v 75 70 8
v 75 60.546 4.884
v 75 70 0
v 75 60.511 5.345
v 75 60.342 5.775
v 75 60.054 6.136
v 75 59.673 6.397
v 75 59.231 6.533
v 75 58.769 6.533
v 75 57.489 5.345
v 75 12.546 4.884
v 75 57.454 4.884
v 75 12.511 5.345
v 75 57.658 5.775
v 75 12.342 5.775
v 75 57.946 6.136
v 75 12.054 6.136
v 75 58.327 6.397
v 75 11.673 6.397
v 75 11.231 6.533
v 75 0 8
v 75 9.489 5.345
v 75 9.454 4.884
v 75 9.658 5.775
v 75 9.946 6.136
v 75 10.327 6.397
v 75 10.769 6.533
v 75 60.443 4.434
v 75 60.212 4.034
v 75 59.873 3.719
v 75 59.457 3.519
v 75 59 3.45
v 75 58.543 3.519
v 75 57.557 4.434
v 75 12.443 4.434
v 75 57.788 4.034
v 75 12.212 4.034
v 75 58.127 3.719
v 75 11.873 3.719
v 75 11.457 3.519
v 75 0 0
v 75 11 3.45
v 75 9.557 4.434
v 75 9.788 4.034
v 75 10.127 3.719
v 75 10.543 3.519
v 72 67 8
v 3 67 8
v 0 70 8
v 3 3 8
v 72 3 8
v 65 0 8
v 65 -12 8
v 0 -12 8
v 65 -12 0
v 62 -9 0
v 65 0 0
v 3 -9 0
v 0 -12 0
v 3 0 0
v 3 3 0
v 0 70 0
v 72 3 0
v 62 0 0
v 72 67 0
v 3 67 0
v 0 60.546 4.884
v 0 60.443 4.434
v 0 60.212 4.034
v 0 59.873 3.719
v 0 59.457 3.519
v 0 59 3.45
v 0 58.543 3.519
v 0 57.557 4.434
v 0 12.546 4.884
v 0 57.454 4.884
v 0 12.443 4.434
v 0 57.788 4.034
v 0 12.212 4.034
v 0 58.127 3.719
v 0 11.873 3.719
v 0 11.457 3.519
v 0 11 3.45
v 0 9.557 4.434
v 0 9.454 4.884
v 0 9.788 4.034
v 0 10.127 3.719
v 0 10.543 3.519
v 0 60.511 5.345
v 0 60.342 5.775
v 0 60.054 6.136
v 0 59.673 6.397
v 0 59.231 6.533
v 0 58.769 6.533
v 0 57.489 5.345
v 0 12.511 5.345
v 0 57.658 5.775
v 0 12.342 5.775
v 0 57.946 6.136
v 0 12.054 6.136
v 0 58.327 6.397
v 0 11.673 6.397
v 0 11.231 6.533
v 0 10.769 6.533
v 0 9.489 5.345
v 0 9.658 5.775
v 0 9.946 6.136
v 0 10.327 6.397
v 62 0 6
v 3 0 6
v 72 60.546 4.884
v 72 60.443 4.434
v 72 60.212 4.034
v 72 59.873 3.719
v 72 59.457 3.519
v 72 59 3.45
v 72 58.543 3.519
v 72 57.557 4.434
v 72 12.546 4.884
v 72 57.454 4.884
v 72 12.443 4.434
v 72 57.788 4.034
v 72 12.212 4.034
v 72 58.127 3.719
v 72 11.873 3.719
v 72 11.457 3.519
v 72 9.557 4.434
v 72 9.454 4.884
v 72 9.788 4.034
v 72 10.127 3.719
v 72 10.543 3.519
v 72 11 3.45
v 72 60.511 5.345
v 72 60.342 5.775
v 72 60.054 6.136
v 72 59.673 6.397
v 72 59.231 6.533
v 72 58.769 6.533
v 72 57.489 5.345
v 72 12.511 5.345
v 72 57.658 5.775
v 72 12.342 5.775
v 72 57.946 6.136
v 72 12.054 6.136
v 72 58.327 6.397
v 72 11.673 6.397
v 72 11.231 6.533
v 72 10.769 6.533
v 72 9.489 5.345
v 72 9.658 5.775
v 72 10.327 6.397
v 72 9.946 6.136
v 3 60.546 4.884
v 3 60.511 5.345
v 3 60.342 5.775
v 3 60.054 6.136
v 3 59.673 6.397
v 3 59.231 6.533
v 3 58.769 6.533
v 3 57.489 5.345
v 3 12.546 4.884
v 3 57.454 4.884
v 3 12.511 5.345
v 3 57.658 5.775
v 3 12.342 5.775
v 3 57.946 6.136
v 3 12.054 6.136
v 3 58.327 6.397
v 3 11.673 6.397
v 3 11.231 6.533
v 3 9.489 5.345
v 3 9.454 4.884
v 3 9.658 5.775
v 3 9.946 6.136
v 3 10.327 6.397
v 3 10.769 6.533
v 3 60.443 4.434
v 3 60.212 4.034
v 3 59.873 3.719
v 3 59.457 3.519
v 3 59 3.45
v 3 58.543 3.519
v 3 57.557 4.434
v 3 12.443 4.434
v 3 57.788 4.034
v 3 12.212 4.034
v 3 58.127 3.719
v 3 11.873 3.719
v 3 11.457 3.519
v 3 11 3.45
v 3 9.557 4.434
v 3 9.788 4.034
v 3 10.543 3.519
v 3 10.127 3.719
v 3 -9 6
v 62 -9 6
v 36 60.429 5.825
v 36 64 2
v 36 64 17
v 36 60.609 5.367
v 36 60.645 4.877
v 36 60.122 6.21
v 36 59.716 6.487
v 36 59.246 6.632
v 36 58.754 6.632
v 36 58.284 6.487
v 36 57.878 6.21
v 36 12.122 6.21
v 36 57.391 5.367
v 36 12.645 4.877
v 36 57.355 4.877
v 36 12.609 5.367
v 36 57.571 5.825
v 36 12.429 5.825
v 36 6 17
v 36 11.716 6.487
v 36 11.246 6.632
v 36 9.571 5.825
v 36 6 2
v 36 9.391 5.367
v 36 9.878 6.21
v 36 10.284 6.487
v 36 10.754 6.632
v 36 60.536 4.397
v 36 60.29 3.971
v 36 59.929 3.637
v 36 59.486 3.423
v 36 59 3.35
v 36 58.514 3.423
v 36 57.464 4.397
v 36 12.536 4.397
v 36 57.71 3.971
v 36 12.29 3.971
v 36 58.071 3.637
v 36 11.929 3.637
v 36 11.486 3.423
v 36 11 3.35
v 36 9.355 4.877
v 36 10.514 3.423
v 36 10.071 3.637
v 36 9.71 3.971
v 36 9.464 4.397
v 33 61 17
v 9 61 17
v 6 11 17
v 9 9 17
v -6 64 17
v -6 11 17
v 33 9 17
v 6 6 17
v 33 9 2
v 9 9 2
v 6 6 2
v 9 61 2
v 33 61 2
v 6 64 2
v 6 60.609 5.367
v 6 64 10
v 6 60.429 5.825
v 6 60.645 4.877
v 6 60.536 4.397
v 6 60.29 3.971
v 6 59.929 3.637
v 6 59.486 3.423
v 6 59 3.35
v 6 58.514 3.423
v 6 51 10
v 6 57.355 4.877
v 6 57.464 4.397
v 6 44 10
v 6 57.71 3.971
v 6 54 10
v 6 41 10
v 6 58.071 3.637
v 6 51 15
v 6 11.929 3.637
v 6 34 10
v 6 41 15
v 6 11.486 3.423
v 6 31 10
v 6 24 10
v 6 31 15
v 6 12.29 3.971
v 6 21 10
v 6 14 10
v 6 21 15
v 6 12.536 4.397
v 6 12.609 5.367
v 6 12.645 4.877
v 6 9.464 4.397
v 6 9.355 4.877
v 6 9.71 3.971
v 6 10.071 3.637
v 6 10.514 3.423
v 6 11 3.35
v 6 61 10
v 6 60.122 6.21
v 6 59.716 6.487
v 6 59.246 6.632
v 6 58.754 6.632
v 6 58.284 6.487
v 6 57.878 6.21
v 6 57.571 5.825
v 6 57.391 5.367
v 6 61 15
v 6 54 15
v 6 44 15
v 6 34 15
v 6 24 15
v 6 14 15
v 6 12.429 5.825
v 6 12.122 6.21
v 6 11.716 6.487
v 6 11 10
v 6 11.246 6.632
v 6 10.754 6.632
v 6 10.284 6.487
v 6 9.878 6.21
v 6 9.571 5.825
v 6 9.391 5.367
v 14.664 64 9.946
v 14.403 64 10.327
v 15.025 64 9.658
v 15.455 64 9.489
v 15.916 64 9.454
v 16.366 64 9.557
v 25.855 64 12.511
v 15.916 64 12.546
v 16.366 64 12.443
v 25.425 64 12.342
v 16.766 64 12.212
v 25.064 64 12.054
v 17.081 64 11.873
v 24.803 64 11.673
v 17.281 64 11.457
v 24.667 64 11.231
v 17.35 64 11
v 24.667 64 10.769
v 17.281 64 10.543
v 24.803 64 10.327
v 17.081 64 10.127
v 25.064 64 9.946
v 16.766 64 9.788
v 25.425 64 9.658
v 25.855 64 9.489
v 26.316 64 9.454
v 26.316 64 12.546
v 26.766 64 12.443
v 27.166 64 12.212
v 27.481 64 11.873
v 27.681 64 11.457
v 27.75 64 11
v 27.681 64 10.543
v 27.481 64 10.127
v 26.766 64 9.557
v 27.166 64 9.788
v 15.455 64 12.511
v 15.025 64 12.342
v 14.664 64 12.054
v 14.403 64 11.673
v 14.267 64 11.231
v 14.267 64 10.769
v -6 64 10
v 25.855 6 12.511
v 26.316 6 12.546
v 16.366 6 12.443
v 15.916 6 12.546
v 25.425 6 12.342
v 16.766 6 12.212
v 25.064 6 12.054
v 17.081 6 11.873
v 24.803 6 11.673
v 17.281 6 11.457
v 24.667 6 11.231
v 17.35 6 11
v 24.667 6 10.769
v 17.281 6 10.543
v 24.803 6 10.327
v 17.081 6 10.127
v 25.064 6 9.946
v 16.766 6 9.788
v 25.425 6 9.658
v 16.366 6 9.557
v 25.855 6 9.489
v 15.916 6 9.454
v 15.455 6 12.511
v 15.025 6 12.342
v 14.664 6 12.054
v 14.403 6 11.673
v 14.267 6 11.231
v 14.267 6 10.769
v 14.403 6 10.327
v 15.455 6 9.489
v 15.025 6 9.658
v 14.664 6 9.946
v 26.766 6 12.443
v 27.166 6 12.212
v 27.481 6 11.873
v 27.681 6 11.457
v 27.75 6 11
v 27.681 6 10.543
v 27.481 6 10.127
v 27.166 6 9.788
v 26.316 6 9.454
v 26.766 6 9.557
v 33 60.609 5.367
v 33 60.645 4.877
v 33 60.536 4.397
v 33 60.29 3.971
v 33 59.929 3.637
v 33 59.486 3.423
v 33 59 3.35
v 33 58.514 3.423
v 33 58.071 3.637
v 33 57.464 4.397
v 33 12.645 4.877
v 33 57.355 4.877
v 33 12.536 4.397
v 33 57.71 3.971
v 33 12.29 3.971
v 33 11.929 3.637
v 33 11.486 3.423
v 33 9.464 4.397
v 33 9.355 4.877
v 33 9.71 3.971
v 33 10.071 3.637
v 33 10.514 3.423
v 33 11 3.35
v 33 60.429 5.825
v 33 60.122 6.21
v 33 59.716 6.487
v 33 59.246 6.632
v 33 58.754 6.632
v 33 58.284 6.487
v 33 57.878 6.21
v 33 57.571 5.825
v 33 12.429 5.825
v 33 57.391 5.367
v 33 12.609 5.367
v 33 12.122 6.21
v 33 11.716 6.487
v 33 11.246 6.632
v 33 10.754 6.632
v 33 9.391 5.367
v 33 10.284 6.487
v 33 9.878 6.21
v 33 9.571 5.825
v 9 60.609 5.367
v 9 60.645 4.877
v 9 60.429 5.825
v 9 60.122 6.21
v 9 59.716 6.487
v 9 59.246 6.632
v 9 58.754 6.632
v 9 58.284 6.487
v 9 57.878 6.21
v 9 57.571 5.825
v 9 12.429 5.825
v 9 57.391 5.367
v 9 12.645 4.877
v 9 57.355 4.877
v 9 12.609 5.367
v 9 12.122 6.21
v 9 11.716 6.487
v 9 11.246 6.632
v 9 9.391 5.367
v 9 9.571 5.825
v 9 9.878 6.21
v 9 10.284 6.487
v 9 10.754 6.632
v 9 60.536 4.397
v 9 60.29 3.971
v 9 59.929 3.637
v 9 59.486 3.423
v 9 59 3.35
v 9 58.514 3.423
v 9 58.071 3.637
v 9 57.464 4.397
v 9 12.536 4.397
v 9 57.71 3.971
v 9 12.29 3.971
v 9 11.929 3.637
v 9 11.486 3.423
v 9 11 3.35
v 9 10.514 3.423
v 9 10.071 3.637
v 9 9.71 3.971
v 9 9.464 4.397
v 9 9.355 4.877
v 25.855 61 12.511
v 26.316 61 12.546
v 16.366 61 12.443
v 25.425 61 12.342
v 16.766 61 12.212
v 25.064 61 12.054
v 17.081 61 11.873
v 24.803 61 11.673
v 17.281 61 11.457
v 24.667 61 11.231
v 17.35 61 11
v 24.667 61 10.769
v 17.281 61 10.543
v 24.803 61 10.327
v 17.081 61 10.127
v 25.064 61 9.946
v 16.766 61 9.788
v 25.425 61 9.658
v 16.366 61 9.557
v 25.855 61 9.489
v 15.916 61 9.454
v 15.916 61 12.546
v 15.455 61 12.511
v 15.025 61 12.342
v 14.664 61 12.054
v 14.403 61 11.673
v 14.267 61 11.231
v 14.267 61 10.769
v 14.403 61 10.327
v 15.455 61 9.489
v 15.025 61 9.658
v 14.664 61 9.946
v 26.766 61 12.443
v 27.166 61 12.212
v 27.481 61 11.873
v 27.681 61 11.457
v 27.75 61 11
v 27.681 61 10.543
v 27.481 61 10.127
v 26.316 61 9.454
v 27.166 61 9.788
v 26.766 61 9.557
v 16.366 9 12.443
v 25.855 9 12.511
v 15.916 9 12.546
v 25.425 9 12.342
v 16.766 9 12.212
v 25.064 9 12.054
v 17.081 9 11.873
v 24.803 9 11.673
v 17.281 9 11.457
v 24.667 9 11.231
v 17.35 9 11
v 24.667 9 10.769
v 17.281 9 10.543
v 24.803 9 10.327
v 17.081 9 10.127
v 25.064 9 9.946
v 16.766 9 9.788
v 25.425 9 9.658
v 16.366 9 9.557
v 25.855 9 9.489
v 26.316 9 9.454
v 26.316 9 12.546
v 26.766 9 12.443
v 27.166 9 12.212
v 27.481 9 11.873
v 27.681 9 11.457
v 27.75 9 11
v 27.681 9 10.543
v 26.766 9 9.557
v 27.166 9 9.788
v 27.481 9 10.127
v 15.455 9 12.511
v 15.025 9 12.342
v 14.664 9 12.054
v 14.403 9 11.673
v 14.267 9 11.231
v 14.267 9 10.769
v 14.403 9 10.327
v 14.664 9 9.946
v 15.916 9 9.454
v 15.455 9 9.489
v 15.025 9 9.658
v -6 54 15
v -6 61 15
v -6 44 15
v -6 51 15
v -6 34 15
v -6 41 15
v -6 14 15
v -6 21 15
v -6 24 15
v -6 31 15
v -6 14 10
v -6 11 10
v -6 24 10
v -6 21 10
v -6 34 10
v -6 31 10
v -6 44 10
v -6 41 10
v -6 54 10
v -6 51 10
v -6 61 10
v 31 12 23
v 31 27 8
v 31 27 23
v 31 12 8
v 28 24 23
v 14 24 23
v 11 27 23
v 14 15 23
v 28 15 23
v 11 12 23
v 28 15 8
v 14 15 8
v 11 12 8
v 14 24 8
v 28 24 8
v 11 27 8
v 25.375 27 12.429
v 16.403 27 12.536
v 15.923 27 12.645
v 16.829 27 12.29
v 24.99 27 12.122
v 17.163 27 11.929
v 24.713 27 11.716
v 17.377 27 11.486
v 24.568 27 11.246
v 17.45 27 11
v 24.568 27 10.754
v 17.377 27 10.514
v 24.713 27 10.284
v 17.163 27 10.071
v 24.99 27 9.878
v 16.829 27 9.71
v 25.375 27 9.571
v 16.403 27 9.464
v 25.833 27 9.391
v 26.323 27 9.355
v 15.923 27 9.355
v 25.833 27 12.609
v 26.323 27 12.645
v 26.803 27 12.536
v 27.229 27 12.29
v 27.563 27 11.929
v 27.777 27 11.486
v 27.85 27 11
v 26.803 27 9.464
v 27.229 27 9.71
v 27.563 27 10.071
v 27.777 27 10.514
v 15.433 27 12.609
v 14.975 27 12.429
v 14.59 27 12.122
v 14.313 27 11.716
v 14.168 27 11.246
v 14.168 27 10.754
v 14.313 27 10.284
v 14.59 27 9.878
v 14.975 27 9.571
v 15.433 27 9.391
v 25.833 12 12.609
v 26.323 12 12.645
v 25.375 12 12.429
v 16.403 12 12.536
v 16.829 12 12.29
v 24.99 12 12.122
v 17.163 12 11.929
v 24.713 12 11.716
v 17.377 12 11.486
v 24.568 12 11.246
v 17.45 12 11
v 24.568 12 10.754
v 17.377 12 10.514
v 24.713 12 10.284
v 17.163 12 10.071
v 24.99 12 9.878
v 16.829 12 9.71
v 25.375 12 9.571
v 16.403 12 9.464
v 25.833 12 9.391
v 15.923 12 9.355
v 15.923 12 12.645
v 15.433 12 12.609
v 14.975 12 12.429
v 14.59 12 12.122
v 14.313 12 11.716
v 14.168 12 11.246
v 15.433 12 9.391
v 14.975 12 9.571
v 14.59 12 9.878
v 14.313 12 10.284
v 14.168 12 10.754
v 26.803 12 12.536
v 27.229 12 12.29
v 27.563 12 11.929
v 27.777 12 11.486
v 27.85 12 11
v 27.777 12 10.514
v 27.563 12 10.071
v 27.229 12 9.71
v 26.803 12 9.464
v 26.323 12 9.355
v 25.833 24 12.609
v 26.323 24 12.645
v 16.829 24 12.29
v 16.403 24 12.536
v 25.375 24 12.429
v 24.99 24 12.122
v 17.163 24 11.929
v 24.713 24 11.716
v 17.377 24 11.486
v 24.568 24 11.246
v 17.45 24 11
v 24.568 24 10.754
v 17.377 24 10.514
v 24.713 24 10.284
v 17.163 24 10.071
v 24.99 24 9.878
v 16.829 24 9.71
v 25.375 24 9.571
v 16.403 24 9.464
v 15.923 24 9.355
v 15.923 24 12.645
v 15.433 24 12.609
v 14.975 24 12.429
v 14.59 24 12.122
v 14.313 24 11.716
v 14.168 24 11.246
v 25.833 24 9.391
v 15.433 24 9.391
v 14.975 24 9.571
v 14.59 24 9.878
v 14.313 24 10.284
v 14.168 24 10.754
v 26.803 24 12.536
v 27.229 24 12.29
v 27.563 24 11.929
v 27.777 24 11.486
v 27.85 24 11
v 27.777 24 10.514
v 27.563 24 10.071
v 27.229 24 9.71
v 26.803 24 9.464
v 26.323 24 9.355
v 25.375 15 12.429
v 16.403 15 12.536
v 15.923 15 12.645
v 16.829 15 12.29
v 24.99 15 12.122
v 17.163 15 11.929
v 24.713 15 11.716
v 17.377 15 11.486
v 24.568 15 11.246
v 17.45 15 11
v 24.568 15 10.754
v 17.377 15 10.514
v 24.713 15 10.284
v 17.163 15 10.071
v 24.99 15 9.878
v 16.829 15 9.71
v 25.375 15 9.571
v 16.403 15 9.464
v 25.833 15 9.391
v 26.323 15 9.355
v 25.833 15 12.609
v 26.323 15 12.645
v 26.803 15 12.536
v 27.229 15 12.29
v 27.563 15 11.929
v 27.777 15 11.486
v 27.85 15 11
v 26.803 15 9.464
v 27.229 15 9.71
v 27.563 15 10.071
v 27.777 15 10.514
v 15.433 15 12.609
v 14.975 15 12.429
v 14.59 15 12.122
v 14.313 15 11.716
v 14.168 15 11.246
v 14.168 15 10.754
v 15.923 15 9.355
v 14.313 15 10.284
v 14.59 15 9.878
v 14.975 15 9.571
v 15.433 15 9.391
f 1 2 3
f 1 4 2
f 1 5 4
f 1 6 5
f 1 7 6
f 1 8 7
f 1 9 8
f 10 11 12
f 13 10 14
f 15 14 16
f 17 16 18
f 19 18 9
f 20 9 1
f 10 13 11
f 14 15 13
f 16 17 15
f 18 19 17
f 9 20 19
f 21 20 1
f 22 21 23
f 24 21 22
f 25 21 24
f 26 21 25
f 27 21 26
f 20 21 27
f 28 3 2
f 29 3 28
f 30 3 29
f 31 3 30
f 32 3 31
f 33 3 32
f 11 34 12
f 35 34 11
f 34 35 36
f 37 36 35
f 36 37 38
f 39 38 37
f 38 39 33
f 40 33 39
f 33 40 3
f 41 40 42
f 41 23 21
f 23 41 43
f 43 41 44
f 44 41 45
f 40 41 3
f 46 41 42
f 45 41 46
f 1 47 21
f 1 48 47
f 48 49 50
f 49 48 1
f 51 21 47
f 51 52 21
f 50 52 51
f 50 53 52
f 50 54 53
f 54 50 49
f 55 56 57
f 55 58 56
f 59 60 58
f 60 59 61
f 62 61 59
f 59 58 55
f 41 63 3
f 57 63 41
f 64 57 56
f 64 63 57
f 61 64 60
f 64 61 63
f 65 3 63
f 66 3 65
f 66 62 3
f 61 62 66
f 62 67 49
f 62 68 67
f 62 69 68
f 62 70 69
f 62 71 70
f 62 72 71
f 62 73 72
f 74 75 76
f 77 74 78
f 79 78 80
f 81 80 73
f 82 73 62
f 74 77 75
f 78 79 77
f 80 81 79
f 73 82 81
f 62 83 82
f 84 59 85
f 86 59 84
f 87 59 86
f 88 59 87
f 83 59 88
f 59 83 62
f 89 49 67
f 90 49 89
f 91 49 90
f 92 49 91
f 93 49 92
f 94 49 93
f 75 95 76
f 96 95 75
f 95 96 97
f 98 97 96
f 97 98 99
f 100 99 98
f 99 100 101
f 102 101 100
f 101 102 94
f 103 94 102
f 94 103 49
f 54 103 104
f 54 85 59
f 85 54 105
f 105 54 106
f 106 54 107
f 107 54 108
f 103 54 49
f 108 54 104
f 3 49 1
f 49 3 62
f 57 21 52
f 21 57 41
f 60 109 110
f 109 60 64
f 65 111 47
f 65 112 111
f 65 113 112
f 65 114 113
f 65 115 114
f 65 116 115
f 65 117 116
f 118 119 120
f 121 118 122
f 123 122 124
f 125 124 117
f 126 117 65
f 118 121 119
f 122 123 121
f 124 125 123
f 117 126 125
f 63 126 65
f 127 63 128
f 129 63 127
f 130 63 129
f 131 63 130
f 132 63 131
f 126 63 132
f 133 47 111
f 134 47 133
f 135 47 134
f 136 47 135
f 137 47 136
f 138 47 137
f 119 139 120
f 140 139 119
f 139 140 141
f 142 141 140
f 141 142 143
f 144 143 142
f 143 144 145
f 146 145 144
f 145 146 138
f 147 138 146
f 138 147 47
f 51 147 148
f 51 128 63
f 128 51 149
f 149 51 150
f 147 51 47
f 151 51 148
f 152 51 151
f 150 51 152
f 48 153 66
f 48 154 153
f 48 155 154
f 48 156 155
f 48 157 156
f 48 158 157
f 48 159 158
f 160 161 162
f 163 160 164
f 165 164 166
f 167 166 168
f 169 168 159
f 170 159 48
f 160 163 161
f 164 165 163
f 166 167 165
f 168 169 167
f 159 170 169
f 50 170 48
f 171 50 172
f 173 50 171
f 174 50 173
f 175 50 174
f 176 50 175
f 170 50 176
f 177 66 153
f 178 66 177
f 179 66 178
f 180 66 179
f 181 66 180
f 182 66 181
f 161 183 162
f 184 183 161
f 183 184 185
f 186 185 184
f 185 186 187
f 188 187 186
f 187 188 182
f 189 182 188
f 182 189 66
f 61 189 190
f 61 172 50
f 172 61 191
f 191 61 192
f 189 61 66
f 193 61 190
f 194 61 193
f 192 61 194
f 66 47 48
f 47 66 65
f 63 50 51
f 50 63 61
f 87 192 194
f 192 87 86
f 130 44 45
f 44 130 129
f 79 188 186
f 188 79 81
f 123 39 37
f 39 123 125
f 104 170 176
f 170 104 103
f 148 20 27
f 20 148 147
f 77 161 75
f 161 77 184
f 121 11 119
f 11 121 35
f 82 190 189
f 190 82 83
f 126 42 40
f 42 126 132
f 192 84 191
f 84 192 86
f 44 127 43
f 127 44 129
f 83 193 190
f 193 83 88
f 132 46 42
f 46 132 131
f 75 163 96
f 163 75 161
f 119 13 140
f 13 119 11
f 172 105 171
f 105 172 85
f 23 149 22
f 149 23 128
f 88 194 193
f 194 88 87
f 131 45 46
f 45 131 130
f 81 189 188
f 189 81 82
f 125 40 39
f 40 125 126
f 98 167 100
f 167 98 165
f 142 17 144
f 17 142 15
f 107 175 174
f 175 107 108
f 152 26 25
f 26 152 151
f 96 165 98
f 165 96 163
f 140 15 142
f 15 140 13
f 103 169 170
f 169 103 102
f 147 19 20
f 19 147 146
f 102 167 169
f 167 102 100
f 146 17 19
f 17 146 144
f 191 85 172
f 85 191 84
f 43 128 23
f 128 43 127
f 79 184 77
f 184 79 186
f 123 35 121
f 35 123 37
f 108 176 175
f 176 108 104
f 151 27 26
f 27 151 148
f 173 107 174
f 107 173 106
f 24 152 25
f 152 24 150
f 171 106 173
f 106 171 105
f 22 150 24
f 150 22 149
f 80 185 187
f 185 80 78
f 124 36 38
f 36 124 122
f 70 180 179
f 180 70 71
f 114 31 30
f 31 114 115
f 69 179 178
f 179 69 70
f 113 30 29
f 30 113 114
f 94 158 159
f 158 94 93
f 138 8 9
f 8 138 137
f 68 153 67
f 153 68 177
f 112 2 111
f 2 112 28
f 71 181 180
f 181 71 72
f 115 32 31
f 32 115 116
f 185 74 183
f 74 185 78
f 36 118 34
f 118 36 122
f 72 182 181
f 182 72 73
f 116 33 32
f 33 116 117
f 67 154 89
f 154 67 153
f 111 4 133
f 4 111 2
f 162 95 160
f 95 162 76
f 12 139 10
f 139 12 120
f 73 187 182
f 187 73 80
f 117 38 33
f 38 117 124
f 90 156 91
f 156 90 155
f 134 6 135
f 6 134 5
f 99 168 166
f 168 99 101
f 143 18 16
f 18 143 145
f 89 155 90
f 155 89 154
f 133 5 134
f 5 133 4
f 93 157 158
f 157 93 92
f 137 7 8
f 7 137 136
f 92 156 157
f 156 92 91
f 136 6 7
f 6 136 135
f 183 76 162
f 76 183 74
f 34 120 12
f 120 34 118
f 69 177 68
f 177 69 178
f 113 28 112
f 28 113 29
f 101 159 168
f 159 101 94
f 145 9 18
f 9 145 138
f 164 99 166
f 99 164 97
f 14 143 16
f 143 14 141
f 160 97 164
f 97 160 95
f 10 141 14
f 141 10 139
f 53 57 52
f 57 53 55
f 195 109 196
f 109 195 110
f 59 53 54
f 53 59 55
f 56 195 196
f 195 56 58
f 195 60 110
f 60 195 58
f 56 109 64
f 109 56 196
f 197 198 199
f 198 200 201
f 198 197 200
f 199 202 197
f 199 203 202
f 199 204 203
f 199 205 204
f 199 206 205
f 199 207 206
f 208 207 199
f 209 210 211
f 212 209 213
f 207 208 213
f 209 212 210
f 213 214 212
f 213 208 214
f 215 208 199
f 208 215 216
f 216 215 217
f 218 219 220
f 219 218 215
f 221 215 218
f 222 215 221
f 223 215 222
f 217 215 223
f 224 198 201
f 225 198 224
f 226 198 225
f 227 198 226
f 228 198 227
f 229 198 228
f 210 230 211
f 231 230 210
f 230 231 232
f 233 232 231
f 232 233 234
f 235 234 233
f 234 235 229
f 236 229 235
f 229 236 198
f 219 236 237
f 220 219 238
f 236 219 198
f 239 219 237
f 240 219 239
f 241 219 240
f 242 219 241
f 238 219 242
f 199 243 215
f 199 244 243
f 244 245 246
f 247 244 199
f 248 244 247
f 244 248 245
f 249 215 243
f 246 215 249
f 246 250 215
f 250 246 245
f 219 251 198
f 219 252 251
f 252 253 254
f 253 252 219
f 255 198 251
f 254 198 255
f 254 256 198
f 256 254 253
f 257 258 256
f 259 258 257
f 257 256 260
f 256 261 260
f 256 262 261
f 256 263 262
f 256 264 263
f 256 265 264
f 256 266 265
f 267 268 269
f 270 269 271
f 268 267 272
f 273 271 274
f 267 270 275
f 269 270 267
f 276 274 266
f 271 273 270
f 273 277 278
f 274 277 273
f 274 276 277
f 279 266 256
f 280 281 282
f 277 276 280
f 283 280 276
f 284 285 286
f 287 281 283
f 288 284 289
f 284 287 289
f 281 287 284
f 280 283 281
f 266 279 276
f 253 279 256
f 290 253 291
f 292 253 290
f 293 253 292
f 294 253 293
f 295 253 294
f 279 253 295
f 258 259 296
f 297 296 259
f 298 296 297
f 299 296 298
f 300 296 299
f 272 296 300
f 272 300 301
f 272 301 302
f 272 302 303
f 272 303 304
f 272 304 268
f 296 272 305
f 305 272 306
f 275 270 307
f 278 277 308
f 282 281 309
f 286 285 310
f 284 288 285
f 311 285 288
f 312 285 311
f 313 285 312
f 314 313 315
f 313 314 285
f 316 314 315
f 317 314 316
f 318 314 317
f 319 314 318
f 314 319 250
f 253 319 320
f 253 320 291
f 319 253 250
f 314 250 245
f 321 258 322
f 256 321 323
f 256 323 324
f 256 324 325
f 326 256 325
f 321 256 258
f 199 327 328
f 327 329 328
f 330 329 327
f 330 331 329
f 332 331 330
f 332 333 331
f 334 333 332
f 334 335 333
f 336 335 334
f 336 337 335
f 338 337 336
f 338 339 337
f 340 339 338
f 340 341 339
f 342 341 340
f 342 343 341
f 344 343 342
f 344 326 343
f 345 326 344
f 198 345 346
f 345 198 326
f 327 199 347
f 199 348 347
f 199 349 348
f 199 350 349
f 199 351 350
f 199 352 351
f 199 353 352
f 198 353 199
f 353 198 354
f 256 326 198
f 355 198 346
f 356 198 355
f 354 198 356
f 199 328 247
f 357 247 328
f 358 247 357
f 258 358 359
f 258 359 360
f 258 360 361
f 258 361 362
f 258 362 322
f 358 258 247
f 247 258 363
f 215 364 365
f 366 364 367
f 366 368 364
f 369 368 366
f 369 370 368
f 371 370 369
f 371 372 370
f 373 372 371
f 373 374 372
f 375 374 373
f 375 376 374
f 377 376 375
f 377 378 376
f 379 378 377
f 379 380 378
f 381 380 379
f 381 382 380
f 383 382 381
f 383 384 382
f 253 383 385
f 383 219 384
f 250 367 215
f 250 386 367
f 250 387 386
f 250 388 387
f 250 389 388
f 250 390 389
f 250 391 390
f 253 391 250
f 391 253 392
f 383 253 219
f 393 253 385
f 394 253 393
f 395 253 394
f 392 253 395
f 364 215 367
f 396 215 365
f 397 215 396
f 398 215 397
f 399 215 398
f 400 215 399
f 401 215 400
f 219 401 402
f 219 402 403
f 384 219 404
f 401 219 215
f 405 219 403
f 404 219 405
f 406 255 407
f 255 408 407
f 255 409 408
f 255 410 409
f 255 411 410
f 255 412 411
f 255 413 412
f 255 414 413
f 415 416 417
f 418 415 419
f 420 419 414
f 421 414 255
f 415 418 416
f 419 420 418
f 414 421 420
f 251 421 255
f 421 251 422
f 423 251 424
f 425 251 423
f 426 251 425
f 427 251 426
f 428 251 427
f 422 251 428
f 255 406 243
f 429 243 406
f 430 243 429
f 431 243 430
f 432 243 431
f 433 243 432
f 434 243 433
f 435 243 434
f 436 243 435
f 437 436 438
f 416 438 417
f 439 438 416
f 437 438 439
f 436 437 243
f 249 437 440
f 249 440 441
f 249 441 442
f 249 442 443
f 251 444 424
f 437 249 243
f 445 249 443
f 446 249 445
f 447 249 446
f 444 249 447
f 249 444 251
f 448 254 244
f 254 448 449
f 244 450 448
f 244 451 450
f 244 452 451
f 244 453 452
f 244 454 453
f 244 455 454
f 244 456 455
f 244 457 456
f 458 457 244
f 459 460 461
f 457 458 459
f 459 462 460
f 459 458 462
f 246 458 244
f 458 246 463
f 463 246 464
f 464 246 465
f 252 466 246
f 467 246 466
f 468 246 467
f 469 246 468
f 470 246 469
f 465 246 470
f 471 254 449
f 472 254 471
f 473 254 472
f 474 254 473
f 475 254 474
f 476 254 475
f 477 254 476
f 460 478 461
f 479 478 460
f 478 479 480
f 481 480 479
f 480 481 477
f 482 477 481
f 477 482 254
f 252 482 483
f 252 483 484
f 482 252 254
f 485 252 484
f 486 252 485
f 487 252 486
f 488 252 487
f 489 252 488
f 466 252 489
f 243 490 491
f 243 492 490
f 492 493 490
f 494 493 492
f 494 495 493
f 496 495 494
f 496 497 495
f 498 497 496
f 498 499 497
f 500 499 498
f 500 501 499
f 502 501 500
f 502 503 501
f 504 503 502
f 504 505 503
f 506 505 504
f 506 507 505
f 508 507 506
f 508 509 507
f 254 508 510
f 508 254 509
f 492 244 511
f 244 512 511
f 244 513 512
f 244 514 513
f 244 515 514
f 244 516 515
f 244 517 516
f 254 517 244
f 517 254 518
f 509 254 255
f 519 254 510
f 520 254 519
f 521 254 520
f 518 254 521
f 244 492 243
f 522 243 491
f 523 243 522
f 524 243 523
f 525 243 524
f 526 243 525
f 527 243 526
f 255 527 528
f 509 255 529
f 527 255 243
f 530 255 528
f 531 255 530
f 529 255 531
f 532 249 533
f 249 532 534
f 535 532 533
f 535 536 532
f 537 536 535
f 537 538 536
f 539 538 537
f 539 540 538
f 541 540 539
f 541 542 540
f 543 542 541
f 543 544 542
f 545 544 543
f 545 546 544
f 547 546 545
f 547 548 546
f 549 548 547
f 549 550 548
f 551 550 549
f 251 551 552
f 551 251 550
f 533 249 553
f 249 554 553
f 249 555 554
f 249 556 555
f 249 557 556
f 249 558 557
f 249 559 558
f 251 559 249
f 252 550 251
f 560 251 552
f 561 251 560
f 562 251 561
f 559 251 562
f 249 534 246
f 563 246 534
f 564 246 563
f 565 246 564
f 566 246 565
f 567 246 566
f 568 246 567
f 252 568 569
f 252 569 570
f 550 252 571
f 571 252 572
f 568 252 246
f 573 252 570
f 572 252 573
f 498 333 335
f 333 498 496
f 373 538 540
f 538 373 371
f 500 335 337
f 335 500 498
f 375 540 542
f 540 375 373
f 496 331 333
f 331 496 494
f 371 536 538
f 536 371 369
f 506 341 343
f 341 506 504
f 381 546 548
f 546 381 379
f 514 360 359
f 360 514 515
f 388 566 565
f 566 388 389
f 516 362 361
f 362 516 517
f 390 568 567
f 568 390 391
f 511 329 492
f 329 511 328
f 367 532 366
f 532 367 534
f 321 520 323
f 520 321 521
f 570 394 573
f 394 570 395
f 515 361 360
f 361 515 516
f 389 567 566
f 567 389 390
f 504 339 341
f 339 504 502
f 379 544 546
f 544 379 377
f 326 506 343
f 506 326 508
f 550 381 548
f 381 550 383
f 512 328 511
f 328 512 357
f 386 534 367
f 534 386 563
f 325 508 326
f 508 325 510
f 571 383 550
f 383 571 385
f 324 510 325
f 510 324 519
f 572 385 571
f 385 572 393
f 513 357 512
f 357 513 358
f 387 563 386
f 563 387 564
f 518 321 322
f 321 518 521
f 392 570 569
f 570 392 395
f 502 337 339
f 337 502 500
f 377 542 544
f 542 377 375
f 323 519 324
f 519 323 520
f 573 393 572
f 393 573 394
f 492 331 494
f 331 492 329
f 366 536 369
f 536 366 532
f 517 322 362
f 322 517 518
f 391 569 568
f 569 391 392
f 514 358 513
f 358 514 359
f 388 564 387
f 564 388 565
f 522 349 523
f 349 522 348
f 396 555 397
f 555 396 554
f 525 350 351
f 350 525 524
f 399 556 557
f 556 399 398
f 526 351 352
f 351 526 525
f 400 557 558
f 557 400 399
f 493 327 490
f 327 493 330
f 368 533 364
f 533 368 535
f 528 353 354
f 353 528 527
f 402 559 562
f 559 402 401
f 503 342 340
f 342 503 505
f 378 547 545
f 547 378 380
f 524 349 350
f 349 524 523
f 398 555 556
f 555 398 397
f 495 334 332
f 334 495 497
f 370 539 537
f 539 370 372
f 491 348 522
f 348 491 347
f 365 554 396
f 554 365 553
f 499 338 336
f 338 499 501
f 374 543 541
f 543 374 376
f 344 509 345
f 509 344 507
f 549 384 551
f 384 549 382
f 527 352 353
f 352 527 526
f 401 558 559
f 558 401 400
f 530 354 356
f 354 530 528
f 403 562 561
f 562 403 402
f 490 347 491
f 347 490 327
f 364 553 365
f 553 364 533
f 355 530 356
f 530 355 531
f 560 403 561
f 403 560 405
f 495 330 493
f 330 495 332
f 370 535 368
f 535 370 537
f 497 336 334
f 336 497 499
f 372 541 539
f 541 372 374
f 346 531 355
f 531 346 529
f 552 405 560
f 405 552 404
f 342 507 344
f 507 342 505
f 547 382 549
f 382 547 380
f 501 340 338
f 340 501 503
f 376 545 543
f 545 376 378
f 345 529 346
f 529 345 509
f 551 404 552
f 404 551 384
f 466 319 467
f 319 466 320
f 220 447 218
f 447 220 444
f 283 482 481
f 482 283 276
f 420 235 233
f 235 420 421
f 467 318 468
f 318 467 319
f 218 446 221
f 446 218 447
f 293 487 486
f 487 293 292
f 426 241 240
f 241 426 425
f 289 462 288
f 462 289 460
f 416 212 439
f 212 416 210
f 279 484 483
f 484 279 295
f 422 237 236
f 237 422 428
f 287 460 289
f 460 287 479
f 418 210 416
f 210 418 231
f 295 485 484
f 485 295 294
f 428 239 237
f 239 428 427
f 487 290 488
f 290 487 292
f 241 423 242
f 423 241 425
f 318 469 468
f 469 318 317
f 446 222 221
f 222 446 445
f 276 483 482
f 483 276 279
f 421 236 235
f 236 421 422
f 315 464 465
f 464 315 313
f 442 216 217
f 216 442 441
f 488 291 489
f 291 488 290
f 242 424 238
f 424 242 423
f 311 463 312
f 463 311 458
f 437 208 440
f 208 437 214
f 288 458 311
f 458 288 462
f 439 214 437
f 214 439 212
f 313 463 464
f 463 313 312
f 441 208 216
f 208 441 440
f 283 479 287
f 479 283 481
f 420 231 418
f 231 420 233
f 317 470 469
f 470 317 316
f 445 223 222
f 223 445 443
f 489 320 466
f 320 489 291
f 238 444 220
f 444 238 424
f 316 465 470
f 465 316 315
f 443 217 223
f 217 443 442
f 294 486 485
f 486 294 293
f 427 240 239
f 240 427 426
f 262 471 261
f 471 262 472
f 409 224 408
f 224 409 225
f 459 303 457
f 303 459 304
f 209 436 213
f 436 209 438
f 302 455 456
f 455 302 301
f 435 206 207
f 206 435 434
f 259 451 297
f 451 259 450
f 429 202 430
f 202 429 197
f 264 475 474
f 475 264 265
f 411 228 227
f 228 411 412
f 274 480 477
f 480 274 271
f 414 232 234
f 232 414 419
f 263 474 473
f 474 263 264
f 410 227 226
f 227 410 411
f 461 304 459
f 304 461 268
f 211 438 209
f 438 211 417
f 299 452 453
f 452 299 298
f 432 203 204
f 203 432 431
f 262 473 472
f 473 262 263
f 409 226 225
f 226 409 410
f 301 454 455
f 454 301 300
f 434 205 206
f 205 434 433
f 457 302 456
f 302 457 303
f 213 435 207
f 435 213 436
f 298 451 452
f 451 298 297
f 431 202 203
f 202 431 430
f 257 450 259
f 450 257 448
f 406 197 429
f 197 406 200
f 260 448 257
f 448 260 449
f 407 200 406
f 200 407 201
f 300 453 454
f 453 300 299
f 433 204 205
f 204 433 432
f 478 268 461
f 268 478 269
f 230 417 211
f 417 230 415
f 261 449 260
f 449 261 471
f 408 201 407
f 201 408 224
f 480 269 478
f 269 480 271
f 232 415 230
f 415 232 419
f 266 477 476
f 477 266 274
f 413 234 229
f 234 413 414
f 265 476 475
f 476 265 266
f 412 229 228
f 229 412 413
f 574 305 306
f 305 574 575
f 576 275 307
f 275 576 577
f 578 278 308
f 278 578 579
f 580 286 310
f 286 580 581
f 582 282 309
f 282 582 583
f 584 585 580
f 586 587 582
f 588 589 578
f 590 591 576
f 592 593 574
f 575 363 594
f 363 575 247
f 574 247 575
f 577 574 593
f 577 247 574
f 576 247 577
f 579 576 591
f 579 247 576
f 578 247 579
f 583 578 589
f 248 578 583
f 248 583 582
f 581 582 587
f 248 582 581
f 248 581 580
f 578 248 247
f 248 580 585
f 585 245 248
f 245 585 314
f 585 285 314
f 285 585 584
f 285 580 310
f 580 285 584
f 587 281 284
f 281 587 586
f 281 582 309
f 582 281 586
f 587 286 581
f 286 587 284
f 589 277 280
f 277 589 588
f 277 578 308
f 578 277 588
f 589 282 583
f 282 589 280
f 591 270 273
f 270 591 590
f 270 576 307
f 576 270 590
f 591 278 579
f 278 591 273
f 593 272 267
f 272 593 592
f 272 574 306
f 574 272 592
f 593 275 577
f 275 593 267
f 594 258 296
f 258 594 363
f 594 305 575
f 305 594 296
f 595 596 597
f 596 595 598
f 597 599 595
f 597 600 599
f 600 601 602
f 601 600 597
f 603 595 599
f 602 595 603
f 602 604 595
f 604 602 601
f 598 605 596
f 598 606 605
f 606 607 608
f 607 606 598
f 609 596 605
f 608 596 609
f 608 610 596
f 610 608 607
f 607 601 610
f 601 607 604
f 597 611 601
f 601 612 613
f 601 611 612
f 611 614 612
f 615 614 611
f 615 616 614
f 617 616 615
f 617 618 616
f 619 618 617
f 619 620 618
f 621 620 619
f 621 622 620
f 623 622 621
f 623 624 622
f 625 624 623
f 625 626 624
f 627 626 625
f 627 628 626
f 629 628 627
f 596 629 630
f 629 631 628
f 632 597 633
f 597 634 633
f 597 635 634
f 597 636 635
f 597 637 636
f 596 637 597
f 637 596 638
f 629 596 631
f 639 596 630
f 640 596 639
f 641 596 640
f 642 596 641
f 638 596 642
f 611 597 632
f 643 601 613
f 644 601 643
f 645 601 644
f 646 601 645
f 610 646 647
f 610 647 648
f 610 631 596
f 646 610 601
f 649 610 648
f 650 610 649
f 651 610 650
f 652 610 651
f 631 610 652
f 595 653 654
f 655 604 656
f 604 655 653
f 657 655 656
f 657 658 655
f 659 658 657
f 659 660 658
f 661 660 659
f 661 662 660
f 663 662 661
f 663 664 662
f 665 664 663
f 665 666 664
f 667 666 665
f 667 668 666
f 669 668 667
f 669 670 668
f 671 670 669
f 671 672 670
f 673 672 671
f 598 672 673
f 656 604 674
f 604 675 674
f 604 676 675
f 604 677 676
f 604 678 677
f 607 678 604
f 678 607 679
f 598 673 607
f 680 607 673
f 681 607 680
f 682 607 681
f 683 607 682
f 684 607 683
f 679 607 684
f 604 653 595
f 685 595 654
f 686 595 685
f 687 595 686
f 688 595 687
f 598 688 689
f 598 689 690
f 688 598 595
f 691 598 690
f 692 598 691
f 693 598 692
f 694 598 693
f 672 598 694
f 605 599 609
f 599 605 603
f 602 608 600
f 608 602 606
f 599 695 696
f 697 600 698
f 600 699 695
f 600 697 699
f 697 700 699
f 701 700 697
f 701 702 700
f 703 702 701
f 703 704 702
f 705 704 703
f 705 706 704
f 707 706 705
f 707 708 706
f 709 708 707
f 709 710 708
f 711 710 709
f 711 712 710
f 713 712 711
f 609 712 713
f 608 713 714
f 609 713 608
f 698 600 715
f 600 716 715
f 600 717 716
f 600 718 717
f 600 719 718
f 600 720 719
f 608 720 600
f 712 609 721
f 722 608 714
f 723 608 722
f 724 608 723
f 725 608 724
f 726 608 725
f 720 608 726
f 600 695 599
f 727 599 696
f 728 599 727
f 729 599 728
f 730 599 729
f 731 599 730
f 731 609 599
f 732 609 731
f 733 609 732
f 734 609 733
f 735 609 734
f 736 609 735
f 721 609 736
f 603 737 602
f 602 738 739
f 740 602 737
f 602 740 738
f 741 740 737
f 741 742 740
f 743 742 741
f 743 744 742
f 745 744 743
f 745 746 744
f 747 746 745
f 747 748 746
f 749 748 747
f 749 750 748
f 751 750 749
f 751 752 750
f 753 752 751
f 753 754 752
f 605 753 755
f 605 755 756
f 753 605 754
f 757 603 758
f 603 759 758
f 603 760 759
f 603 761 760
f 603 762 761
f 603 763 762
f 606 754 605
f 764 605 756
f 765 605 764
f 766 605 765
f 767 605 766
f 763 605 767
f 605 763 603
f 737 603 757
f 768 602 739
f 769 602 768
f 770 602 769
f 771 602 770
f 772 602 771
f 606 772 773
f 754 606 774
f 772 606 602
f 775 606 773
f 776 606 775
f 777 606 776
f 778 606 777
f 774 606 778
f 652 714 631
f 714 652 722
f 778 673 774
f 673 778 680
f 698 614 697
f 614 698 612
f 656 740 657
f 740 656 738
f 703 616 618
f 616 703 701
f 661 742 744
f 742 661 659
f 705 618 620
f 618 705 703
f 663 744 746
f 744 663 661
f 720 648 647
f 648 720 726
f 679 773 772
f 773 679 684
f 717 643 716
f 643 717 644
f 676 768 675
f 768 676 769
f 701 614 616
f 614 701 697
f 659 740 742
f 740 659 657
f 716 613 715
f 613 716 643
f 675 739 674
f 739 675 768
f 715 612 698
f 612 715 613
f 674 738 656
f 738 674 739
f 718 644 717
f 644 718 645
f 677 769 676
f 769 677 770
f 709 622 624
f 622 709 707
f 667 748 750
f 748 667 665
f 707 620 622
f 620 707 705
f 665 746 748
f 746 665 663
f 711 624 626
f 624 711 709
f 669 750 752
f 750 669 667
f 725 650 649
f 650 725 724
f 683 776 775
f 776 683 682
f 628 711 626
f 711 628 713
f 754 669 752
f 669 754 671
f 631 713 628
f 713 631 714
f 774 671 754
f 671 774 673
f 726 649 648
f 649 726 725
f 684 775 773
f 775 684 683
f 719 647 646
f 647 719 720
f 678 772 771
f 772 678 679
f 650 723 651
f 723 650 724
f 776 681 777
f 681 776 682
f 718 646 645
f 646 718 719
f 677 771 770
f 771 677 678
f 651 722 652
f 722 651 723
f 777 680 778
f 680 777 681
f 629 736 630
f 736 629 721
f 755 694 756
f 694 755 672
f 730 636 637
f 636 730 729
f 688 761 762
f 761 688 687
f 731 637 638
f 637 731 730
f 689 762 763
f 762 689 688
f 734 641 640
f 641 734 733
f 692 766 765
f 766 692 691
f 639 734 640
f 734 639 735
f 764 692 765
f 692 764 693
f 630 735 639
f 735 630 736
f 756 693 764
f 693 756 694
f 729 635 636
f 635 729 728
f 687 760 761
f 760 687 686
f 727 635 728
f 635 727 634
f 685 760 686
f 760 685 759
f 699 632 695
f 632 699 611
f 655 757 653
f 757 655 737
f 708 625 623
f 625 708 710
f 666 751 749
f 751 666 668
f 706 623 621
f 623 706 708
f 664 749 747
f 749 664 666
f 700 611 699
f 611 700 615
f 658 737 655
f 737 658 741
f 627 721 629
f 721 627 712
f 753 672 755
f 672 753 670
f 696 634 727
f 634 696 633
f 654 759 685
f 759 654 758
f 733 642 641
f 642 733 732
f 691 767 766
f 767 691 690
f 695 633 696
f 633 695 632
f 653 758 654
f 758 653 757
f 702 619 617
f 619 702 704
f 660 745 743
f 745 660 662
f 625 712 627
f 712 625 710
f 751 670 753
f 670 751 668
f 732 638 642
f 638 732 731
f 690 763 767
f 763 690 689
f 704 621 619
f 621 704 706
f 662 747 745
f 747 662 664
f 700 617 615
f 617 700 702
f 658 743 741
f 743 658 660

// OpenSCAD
$fn=21;

r1=3.1;
r2=3.3;

// OUTER
union() {
    difference() { 
        cube([75, 70, 8]);   
        translate([3,3,-1])
            cube([69, 64, 12]);    
        #translate([-0.1, 11, 5])
            rotate([0,90,0])
            cylinder(r=r1/2, h=75.2);    
        #translate([-0.1, 59, 5])
            rotate([0,90,0])
            cylinder(r=r1/2, h=75.2);
    }
    translate([0,-12,6])
        cube([65, 12, 2]);
    translate([0,-12,0])
        cube([65, 3, 6]);
    translate([0,-9,0])
        cube([3, 9, 6]);
    translate([62,-9,0])
        cube([3, 9, 6]);
}

//INNER
union() {
    difference() { 
        translate([6,6,2])
            cube([30, 58, 15]);   
        translate([9,9,1])
            cube([24, 52, 17]);    
        #translate([15.8, 64.9, 11])
            rotate([90,0,0])
            cylinder(r=r1/2, h=59.0);    
        #translate([26.2, 64.9, 11])
            rotate([90,0,0])
            cylinder(r=r1/2, h=59.0);
        translate([-0.1, 11, 5])
            rotate([0,90,0])
            cylinder(r=r2/2, h=75.2);    
        translate([-0.1, 59, 5])
            rotate([0,90,0])
            cylinder(r=r2/2, h=75.2);
    }
    translate([-6,11,15])
        cube([12, 53, 2]);
    #translate([-6,11,10])
        cube([12, 3, 5]);
    #translate([-6,21,10])
        cube([12, 3, 5]);
    #translate([-6,31,10])
        cube([12, 3, 5]);
    #translate([-6,41,10])
        cube([12, 3, 5]);
    #translate([-6,51,10])
        cube([12, 3, 5]);
    #translate([-6,61,10])
        cube([12, 3, 5]);
}


difference() { 
    translate([11,12,8])
        cube([20, 15, 15]);   
    translate([14, 15,-1])
        cube([14, 9, 37]);    
    translate([15.8, 64.9, 11])
        rotate([90,0,0])
        cylinder(r=r2/2, h=59.0);    
    translate([26.2, 64.9, 11])
        rotate([90,0,0])
        cylinder(r=r2/2, h=59.0);
}
